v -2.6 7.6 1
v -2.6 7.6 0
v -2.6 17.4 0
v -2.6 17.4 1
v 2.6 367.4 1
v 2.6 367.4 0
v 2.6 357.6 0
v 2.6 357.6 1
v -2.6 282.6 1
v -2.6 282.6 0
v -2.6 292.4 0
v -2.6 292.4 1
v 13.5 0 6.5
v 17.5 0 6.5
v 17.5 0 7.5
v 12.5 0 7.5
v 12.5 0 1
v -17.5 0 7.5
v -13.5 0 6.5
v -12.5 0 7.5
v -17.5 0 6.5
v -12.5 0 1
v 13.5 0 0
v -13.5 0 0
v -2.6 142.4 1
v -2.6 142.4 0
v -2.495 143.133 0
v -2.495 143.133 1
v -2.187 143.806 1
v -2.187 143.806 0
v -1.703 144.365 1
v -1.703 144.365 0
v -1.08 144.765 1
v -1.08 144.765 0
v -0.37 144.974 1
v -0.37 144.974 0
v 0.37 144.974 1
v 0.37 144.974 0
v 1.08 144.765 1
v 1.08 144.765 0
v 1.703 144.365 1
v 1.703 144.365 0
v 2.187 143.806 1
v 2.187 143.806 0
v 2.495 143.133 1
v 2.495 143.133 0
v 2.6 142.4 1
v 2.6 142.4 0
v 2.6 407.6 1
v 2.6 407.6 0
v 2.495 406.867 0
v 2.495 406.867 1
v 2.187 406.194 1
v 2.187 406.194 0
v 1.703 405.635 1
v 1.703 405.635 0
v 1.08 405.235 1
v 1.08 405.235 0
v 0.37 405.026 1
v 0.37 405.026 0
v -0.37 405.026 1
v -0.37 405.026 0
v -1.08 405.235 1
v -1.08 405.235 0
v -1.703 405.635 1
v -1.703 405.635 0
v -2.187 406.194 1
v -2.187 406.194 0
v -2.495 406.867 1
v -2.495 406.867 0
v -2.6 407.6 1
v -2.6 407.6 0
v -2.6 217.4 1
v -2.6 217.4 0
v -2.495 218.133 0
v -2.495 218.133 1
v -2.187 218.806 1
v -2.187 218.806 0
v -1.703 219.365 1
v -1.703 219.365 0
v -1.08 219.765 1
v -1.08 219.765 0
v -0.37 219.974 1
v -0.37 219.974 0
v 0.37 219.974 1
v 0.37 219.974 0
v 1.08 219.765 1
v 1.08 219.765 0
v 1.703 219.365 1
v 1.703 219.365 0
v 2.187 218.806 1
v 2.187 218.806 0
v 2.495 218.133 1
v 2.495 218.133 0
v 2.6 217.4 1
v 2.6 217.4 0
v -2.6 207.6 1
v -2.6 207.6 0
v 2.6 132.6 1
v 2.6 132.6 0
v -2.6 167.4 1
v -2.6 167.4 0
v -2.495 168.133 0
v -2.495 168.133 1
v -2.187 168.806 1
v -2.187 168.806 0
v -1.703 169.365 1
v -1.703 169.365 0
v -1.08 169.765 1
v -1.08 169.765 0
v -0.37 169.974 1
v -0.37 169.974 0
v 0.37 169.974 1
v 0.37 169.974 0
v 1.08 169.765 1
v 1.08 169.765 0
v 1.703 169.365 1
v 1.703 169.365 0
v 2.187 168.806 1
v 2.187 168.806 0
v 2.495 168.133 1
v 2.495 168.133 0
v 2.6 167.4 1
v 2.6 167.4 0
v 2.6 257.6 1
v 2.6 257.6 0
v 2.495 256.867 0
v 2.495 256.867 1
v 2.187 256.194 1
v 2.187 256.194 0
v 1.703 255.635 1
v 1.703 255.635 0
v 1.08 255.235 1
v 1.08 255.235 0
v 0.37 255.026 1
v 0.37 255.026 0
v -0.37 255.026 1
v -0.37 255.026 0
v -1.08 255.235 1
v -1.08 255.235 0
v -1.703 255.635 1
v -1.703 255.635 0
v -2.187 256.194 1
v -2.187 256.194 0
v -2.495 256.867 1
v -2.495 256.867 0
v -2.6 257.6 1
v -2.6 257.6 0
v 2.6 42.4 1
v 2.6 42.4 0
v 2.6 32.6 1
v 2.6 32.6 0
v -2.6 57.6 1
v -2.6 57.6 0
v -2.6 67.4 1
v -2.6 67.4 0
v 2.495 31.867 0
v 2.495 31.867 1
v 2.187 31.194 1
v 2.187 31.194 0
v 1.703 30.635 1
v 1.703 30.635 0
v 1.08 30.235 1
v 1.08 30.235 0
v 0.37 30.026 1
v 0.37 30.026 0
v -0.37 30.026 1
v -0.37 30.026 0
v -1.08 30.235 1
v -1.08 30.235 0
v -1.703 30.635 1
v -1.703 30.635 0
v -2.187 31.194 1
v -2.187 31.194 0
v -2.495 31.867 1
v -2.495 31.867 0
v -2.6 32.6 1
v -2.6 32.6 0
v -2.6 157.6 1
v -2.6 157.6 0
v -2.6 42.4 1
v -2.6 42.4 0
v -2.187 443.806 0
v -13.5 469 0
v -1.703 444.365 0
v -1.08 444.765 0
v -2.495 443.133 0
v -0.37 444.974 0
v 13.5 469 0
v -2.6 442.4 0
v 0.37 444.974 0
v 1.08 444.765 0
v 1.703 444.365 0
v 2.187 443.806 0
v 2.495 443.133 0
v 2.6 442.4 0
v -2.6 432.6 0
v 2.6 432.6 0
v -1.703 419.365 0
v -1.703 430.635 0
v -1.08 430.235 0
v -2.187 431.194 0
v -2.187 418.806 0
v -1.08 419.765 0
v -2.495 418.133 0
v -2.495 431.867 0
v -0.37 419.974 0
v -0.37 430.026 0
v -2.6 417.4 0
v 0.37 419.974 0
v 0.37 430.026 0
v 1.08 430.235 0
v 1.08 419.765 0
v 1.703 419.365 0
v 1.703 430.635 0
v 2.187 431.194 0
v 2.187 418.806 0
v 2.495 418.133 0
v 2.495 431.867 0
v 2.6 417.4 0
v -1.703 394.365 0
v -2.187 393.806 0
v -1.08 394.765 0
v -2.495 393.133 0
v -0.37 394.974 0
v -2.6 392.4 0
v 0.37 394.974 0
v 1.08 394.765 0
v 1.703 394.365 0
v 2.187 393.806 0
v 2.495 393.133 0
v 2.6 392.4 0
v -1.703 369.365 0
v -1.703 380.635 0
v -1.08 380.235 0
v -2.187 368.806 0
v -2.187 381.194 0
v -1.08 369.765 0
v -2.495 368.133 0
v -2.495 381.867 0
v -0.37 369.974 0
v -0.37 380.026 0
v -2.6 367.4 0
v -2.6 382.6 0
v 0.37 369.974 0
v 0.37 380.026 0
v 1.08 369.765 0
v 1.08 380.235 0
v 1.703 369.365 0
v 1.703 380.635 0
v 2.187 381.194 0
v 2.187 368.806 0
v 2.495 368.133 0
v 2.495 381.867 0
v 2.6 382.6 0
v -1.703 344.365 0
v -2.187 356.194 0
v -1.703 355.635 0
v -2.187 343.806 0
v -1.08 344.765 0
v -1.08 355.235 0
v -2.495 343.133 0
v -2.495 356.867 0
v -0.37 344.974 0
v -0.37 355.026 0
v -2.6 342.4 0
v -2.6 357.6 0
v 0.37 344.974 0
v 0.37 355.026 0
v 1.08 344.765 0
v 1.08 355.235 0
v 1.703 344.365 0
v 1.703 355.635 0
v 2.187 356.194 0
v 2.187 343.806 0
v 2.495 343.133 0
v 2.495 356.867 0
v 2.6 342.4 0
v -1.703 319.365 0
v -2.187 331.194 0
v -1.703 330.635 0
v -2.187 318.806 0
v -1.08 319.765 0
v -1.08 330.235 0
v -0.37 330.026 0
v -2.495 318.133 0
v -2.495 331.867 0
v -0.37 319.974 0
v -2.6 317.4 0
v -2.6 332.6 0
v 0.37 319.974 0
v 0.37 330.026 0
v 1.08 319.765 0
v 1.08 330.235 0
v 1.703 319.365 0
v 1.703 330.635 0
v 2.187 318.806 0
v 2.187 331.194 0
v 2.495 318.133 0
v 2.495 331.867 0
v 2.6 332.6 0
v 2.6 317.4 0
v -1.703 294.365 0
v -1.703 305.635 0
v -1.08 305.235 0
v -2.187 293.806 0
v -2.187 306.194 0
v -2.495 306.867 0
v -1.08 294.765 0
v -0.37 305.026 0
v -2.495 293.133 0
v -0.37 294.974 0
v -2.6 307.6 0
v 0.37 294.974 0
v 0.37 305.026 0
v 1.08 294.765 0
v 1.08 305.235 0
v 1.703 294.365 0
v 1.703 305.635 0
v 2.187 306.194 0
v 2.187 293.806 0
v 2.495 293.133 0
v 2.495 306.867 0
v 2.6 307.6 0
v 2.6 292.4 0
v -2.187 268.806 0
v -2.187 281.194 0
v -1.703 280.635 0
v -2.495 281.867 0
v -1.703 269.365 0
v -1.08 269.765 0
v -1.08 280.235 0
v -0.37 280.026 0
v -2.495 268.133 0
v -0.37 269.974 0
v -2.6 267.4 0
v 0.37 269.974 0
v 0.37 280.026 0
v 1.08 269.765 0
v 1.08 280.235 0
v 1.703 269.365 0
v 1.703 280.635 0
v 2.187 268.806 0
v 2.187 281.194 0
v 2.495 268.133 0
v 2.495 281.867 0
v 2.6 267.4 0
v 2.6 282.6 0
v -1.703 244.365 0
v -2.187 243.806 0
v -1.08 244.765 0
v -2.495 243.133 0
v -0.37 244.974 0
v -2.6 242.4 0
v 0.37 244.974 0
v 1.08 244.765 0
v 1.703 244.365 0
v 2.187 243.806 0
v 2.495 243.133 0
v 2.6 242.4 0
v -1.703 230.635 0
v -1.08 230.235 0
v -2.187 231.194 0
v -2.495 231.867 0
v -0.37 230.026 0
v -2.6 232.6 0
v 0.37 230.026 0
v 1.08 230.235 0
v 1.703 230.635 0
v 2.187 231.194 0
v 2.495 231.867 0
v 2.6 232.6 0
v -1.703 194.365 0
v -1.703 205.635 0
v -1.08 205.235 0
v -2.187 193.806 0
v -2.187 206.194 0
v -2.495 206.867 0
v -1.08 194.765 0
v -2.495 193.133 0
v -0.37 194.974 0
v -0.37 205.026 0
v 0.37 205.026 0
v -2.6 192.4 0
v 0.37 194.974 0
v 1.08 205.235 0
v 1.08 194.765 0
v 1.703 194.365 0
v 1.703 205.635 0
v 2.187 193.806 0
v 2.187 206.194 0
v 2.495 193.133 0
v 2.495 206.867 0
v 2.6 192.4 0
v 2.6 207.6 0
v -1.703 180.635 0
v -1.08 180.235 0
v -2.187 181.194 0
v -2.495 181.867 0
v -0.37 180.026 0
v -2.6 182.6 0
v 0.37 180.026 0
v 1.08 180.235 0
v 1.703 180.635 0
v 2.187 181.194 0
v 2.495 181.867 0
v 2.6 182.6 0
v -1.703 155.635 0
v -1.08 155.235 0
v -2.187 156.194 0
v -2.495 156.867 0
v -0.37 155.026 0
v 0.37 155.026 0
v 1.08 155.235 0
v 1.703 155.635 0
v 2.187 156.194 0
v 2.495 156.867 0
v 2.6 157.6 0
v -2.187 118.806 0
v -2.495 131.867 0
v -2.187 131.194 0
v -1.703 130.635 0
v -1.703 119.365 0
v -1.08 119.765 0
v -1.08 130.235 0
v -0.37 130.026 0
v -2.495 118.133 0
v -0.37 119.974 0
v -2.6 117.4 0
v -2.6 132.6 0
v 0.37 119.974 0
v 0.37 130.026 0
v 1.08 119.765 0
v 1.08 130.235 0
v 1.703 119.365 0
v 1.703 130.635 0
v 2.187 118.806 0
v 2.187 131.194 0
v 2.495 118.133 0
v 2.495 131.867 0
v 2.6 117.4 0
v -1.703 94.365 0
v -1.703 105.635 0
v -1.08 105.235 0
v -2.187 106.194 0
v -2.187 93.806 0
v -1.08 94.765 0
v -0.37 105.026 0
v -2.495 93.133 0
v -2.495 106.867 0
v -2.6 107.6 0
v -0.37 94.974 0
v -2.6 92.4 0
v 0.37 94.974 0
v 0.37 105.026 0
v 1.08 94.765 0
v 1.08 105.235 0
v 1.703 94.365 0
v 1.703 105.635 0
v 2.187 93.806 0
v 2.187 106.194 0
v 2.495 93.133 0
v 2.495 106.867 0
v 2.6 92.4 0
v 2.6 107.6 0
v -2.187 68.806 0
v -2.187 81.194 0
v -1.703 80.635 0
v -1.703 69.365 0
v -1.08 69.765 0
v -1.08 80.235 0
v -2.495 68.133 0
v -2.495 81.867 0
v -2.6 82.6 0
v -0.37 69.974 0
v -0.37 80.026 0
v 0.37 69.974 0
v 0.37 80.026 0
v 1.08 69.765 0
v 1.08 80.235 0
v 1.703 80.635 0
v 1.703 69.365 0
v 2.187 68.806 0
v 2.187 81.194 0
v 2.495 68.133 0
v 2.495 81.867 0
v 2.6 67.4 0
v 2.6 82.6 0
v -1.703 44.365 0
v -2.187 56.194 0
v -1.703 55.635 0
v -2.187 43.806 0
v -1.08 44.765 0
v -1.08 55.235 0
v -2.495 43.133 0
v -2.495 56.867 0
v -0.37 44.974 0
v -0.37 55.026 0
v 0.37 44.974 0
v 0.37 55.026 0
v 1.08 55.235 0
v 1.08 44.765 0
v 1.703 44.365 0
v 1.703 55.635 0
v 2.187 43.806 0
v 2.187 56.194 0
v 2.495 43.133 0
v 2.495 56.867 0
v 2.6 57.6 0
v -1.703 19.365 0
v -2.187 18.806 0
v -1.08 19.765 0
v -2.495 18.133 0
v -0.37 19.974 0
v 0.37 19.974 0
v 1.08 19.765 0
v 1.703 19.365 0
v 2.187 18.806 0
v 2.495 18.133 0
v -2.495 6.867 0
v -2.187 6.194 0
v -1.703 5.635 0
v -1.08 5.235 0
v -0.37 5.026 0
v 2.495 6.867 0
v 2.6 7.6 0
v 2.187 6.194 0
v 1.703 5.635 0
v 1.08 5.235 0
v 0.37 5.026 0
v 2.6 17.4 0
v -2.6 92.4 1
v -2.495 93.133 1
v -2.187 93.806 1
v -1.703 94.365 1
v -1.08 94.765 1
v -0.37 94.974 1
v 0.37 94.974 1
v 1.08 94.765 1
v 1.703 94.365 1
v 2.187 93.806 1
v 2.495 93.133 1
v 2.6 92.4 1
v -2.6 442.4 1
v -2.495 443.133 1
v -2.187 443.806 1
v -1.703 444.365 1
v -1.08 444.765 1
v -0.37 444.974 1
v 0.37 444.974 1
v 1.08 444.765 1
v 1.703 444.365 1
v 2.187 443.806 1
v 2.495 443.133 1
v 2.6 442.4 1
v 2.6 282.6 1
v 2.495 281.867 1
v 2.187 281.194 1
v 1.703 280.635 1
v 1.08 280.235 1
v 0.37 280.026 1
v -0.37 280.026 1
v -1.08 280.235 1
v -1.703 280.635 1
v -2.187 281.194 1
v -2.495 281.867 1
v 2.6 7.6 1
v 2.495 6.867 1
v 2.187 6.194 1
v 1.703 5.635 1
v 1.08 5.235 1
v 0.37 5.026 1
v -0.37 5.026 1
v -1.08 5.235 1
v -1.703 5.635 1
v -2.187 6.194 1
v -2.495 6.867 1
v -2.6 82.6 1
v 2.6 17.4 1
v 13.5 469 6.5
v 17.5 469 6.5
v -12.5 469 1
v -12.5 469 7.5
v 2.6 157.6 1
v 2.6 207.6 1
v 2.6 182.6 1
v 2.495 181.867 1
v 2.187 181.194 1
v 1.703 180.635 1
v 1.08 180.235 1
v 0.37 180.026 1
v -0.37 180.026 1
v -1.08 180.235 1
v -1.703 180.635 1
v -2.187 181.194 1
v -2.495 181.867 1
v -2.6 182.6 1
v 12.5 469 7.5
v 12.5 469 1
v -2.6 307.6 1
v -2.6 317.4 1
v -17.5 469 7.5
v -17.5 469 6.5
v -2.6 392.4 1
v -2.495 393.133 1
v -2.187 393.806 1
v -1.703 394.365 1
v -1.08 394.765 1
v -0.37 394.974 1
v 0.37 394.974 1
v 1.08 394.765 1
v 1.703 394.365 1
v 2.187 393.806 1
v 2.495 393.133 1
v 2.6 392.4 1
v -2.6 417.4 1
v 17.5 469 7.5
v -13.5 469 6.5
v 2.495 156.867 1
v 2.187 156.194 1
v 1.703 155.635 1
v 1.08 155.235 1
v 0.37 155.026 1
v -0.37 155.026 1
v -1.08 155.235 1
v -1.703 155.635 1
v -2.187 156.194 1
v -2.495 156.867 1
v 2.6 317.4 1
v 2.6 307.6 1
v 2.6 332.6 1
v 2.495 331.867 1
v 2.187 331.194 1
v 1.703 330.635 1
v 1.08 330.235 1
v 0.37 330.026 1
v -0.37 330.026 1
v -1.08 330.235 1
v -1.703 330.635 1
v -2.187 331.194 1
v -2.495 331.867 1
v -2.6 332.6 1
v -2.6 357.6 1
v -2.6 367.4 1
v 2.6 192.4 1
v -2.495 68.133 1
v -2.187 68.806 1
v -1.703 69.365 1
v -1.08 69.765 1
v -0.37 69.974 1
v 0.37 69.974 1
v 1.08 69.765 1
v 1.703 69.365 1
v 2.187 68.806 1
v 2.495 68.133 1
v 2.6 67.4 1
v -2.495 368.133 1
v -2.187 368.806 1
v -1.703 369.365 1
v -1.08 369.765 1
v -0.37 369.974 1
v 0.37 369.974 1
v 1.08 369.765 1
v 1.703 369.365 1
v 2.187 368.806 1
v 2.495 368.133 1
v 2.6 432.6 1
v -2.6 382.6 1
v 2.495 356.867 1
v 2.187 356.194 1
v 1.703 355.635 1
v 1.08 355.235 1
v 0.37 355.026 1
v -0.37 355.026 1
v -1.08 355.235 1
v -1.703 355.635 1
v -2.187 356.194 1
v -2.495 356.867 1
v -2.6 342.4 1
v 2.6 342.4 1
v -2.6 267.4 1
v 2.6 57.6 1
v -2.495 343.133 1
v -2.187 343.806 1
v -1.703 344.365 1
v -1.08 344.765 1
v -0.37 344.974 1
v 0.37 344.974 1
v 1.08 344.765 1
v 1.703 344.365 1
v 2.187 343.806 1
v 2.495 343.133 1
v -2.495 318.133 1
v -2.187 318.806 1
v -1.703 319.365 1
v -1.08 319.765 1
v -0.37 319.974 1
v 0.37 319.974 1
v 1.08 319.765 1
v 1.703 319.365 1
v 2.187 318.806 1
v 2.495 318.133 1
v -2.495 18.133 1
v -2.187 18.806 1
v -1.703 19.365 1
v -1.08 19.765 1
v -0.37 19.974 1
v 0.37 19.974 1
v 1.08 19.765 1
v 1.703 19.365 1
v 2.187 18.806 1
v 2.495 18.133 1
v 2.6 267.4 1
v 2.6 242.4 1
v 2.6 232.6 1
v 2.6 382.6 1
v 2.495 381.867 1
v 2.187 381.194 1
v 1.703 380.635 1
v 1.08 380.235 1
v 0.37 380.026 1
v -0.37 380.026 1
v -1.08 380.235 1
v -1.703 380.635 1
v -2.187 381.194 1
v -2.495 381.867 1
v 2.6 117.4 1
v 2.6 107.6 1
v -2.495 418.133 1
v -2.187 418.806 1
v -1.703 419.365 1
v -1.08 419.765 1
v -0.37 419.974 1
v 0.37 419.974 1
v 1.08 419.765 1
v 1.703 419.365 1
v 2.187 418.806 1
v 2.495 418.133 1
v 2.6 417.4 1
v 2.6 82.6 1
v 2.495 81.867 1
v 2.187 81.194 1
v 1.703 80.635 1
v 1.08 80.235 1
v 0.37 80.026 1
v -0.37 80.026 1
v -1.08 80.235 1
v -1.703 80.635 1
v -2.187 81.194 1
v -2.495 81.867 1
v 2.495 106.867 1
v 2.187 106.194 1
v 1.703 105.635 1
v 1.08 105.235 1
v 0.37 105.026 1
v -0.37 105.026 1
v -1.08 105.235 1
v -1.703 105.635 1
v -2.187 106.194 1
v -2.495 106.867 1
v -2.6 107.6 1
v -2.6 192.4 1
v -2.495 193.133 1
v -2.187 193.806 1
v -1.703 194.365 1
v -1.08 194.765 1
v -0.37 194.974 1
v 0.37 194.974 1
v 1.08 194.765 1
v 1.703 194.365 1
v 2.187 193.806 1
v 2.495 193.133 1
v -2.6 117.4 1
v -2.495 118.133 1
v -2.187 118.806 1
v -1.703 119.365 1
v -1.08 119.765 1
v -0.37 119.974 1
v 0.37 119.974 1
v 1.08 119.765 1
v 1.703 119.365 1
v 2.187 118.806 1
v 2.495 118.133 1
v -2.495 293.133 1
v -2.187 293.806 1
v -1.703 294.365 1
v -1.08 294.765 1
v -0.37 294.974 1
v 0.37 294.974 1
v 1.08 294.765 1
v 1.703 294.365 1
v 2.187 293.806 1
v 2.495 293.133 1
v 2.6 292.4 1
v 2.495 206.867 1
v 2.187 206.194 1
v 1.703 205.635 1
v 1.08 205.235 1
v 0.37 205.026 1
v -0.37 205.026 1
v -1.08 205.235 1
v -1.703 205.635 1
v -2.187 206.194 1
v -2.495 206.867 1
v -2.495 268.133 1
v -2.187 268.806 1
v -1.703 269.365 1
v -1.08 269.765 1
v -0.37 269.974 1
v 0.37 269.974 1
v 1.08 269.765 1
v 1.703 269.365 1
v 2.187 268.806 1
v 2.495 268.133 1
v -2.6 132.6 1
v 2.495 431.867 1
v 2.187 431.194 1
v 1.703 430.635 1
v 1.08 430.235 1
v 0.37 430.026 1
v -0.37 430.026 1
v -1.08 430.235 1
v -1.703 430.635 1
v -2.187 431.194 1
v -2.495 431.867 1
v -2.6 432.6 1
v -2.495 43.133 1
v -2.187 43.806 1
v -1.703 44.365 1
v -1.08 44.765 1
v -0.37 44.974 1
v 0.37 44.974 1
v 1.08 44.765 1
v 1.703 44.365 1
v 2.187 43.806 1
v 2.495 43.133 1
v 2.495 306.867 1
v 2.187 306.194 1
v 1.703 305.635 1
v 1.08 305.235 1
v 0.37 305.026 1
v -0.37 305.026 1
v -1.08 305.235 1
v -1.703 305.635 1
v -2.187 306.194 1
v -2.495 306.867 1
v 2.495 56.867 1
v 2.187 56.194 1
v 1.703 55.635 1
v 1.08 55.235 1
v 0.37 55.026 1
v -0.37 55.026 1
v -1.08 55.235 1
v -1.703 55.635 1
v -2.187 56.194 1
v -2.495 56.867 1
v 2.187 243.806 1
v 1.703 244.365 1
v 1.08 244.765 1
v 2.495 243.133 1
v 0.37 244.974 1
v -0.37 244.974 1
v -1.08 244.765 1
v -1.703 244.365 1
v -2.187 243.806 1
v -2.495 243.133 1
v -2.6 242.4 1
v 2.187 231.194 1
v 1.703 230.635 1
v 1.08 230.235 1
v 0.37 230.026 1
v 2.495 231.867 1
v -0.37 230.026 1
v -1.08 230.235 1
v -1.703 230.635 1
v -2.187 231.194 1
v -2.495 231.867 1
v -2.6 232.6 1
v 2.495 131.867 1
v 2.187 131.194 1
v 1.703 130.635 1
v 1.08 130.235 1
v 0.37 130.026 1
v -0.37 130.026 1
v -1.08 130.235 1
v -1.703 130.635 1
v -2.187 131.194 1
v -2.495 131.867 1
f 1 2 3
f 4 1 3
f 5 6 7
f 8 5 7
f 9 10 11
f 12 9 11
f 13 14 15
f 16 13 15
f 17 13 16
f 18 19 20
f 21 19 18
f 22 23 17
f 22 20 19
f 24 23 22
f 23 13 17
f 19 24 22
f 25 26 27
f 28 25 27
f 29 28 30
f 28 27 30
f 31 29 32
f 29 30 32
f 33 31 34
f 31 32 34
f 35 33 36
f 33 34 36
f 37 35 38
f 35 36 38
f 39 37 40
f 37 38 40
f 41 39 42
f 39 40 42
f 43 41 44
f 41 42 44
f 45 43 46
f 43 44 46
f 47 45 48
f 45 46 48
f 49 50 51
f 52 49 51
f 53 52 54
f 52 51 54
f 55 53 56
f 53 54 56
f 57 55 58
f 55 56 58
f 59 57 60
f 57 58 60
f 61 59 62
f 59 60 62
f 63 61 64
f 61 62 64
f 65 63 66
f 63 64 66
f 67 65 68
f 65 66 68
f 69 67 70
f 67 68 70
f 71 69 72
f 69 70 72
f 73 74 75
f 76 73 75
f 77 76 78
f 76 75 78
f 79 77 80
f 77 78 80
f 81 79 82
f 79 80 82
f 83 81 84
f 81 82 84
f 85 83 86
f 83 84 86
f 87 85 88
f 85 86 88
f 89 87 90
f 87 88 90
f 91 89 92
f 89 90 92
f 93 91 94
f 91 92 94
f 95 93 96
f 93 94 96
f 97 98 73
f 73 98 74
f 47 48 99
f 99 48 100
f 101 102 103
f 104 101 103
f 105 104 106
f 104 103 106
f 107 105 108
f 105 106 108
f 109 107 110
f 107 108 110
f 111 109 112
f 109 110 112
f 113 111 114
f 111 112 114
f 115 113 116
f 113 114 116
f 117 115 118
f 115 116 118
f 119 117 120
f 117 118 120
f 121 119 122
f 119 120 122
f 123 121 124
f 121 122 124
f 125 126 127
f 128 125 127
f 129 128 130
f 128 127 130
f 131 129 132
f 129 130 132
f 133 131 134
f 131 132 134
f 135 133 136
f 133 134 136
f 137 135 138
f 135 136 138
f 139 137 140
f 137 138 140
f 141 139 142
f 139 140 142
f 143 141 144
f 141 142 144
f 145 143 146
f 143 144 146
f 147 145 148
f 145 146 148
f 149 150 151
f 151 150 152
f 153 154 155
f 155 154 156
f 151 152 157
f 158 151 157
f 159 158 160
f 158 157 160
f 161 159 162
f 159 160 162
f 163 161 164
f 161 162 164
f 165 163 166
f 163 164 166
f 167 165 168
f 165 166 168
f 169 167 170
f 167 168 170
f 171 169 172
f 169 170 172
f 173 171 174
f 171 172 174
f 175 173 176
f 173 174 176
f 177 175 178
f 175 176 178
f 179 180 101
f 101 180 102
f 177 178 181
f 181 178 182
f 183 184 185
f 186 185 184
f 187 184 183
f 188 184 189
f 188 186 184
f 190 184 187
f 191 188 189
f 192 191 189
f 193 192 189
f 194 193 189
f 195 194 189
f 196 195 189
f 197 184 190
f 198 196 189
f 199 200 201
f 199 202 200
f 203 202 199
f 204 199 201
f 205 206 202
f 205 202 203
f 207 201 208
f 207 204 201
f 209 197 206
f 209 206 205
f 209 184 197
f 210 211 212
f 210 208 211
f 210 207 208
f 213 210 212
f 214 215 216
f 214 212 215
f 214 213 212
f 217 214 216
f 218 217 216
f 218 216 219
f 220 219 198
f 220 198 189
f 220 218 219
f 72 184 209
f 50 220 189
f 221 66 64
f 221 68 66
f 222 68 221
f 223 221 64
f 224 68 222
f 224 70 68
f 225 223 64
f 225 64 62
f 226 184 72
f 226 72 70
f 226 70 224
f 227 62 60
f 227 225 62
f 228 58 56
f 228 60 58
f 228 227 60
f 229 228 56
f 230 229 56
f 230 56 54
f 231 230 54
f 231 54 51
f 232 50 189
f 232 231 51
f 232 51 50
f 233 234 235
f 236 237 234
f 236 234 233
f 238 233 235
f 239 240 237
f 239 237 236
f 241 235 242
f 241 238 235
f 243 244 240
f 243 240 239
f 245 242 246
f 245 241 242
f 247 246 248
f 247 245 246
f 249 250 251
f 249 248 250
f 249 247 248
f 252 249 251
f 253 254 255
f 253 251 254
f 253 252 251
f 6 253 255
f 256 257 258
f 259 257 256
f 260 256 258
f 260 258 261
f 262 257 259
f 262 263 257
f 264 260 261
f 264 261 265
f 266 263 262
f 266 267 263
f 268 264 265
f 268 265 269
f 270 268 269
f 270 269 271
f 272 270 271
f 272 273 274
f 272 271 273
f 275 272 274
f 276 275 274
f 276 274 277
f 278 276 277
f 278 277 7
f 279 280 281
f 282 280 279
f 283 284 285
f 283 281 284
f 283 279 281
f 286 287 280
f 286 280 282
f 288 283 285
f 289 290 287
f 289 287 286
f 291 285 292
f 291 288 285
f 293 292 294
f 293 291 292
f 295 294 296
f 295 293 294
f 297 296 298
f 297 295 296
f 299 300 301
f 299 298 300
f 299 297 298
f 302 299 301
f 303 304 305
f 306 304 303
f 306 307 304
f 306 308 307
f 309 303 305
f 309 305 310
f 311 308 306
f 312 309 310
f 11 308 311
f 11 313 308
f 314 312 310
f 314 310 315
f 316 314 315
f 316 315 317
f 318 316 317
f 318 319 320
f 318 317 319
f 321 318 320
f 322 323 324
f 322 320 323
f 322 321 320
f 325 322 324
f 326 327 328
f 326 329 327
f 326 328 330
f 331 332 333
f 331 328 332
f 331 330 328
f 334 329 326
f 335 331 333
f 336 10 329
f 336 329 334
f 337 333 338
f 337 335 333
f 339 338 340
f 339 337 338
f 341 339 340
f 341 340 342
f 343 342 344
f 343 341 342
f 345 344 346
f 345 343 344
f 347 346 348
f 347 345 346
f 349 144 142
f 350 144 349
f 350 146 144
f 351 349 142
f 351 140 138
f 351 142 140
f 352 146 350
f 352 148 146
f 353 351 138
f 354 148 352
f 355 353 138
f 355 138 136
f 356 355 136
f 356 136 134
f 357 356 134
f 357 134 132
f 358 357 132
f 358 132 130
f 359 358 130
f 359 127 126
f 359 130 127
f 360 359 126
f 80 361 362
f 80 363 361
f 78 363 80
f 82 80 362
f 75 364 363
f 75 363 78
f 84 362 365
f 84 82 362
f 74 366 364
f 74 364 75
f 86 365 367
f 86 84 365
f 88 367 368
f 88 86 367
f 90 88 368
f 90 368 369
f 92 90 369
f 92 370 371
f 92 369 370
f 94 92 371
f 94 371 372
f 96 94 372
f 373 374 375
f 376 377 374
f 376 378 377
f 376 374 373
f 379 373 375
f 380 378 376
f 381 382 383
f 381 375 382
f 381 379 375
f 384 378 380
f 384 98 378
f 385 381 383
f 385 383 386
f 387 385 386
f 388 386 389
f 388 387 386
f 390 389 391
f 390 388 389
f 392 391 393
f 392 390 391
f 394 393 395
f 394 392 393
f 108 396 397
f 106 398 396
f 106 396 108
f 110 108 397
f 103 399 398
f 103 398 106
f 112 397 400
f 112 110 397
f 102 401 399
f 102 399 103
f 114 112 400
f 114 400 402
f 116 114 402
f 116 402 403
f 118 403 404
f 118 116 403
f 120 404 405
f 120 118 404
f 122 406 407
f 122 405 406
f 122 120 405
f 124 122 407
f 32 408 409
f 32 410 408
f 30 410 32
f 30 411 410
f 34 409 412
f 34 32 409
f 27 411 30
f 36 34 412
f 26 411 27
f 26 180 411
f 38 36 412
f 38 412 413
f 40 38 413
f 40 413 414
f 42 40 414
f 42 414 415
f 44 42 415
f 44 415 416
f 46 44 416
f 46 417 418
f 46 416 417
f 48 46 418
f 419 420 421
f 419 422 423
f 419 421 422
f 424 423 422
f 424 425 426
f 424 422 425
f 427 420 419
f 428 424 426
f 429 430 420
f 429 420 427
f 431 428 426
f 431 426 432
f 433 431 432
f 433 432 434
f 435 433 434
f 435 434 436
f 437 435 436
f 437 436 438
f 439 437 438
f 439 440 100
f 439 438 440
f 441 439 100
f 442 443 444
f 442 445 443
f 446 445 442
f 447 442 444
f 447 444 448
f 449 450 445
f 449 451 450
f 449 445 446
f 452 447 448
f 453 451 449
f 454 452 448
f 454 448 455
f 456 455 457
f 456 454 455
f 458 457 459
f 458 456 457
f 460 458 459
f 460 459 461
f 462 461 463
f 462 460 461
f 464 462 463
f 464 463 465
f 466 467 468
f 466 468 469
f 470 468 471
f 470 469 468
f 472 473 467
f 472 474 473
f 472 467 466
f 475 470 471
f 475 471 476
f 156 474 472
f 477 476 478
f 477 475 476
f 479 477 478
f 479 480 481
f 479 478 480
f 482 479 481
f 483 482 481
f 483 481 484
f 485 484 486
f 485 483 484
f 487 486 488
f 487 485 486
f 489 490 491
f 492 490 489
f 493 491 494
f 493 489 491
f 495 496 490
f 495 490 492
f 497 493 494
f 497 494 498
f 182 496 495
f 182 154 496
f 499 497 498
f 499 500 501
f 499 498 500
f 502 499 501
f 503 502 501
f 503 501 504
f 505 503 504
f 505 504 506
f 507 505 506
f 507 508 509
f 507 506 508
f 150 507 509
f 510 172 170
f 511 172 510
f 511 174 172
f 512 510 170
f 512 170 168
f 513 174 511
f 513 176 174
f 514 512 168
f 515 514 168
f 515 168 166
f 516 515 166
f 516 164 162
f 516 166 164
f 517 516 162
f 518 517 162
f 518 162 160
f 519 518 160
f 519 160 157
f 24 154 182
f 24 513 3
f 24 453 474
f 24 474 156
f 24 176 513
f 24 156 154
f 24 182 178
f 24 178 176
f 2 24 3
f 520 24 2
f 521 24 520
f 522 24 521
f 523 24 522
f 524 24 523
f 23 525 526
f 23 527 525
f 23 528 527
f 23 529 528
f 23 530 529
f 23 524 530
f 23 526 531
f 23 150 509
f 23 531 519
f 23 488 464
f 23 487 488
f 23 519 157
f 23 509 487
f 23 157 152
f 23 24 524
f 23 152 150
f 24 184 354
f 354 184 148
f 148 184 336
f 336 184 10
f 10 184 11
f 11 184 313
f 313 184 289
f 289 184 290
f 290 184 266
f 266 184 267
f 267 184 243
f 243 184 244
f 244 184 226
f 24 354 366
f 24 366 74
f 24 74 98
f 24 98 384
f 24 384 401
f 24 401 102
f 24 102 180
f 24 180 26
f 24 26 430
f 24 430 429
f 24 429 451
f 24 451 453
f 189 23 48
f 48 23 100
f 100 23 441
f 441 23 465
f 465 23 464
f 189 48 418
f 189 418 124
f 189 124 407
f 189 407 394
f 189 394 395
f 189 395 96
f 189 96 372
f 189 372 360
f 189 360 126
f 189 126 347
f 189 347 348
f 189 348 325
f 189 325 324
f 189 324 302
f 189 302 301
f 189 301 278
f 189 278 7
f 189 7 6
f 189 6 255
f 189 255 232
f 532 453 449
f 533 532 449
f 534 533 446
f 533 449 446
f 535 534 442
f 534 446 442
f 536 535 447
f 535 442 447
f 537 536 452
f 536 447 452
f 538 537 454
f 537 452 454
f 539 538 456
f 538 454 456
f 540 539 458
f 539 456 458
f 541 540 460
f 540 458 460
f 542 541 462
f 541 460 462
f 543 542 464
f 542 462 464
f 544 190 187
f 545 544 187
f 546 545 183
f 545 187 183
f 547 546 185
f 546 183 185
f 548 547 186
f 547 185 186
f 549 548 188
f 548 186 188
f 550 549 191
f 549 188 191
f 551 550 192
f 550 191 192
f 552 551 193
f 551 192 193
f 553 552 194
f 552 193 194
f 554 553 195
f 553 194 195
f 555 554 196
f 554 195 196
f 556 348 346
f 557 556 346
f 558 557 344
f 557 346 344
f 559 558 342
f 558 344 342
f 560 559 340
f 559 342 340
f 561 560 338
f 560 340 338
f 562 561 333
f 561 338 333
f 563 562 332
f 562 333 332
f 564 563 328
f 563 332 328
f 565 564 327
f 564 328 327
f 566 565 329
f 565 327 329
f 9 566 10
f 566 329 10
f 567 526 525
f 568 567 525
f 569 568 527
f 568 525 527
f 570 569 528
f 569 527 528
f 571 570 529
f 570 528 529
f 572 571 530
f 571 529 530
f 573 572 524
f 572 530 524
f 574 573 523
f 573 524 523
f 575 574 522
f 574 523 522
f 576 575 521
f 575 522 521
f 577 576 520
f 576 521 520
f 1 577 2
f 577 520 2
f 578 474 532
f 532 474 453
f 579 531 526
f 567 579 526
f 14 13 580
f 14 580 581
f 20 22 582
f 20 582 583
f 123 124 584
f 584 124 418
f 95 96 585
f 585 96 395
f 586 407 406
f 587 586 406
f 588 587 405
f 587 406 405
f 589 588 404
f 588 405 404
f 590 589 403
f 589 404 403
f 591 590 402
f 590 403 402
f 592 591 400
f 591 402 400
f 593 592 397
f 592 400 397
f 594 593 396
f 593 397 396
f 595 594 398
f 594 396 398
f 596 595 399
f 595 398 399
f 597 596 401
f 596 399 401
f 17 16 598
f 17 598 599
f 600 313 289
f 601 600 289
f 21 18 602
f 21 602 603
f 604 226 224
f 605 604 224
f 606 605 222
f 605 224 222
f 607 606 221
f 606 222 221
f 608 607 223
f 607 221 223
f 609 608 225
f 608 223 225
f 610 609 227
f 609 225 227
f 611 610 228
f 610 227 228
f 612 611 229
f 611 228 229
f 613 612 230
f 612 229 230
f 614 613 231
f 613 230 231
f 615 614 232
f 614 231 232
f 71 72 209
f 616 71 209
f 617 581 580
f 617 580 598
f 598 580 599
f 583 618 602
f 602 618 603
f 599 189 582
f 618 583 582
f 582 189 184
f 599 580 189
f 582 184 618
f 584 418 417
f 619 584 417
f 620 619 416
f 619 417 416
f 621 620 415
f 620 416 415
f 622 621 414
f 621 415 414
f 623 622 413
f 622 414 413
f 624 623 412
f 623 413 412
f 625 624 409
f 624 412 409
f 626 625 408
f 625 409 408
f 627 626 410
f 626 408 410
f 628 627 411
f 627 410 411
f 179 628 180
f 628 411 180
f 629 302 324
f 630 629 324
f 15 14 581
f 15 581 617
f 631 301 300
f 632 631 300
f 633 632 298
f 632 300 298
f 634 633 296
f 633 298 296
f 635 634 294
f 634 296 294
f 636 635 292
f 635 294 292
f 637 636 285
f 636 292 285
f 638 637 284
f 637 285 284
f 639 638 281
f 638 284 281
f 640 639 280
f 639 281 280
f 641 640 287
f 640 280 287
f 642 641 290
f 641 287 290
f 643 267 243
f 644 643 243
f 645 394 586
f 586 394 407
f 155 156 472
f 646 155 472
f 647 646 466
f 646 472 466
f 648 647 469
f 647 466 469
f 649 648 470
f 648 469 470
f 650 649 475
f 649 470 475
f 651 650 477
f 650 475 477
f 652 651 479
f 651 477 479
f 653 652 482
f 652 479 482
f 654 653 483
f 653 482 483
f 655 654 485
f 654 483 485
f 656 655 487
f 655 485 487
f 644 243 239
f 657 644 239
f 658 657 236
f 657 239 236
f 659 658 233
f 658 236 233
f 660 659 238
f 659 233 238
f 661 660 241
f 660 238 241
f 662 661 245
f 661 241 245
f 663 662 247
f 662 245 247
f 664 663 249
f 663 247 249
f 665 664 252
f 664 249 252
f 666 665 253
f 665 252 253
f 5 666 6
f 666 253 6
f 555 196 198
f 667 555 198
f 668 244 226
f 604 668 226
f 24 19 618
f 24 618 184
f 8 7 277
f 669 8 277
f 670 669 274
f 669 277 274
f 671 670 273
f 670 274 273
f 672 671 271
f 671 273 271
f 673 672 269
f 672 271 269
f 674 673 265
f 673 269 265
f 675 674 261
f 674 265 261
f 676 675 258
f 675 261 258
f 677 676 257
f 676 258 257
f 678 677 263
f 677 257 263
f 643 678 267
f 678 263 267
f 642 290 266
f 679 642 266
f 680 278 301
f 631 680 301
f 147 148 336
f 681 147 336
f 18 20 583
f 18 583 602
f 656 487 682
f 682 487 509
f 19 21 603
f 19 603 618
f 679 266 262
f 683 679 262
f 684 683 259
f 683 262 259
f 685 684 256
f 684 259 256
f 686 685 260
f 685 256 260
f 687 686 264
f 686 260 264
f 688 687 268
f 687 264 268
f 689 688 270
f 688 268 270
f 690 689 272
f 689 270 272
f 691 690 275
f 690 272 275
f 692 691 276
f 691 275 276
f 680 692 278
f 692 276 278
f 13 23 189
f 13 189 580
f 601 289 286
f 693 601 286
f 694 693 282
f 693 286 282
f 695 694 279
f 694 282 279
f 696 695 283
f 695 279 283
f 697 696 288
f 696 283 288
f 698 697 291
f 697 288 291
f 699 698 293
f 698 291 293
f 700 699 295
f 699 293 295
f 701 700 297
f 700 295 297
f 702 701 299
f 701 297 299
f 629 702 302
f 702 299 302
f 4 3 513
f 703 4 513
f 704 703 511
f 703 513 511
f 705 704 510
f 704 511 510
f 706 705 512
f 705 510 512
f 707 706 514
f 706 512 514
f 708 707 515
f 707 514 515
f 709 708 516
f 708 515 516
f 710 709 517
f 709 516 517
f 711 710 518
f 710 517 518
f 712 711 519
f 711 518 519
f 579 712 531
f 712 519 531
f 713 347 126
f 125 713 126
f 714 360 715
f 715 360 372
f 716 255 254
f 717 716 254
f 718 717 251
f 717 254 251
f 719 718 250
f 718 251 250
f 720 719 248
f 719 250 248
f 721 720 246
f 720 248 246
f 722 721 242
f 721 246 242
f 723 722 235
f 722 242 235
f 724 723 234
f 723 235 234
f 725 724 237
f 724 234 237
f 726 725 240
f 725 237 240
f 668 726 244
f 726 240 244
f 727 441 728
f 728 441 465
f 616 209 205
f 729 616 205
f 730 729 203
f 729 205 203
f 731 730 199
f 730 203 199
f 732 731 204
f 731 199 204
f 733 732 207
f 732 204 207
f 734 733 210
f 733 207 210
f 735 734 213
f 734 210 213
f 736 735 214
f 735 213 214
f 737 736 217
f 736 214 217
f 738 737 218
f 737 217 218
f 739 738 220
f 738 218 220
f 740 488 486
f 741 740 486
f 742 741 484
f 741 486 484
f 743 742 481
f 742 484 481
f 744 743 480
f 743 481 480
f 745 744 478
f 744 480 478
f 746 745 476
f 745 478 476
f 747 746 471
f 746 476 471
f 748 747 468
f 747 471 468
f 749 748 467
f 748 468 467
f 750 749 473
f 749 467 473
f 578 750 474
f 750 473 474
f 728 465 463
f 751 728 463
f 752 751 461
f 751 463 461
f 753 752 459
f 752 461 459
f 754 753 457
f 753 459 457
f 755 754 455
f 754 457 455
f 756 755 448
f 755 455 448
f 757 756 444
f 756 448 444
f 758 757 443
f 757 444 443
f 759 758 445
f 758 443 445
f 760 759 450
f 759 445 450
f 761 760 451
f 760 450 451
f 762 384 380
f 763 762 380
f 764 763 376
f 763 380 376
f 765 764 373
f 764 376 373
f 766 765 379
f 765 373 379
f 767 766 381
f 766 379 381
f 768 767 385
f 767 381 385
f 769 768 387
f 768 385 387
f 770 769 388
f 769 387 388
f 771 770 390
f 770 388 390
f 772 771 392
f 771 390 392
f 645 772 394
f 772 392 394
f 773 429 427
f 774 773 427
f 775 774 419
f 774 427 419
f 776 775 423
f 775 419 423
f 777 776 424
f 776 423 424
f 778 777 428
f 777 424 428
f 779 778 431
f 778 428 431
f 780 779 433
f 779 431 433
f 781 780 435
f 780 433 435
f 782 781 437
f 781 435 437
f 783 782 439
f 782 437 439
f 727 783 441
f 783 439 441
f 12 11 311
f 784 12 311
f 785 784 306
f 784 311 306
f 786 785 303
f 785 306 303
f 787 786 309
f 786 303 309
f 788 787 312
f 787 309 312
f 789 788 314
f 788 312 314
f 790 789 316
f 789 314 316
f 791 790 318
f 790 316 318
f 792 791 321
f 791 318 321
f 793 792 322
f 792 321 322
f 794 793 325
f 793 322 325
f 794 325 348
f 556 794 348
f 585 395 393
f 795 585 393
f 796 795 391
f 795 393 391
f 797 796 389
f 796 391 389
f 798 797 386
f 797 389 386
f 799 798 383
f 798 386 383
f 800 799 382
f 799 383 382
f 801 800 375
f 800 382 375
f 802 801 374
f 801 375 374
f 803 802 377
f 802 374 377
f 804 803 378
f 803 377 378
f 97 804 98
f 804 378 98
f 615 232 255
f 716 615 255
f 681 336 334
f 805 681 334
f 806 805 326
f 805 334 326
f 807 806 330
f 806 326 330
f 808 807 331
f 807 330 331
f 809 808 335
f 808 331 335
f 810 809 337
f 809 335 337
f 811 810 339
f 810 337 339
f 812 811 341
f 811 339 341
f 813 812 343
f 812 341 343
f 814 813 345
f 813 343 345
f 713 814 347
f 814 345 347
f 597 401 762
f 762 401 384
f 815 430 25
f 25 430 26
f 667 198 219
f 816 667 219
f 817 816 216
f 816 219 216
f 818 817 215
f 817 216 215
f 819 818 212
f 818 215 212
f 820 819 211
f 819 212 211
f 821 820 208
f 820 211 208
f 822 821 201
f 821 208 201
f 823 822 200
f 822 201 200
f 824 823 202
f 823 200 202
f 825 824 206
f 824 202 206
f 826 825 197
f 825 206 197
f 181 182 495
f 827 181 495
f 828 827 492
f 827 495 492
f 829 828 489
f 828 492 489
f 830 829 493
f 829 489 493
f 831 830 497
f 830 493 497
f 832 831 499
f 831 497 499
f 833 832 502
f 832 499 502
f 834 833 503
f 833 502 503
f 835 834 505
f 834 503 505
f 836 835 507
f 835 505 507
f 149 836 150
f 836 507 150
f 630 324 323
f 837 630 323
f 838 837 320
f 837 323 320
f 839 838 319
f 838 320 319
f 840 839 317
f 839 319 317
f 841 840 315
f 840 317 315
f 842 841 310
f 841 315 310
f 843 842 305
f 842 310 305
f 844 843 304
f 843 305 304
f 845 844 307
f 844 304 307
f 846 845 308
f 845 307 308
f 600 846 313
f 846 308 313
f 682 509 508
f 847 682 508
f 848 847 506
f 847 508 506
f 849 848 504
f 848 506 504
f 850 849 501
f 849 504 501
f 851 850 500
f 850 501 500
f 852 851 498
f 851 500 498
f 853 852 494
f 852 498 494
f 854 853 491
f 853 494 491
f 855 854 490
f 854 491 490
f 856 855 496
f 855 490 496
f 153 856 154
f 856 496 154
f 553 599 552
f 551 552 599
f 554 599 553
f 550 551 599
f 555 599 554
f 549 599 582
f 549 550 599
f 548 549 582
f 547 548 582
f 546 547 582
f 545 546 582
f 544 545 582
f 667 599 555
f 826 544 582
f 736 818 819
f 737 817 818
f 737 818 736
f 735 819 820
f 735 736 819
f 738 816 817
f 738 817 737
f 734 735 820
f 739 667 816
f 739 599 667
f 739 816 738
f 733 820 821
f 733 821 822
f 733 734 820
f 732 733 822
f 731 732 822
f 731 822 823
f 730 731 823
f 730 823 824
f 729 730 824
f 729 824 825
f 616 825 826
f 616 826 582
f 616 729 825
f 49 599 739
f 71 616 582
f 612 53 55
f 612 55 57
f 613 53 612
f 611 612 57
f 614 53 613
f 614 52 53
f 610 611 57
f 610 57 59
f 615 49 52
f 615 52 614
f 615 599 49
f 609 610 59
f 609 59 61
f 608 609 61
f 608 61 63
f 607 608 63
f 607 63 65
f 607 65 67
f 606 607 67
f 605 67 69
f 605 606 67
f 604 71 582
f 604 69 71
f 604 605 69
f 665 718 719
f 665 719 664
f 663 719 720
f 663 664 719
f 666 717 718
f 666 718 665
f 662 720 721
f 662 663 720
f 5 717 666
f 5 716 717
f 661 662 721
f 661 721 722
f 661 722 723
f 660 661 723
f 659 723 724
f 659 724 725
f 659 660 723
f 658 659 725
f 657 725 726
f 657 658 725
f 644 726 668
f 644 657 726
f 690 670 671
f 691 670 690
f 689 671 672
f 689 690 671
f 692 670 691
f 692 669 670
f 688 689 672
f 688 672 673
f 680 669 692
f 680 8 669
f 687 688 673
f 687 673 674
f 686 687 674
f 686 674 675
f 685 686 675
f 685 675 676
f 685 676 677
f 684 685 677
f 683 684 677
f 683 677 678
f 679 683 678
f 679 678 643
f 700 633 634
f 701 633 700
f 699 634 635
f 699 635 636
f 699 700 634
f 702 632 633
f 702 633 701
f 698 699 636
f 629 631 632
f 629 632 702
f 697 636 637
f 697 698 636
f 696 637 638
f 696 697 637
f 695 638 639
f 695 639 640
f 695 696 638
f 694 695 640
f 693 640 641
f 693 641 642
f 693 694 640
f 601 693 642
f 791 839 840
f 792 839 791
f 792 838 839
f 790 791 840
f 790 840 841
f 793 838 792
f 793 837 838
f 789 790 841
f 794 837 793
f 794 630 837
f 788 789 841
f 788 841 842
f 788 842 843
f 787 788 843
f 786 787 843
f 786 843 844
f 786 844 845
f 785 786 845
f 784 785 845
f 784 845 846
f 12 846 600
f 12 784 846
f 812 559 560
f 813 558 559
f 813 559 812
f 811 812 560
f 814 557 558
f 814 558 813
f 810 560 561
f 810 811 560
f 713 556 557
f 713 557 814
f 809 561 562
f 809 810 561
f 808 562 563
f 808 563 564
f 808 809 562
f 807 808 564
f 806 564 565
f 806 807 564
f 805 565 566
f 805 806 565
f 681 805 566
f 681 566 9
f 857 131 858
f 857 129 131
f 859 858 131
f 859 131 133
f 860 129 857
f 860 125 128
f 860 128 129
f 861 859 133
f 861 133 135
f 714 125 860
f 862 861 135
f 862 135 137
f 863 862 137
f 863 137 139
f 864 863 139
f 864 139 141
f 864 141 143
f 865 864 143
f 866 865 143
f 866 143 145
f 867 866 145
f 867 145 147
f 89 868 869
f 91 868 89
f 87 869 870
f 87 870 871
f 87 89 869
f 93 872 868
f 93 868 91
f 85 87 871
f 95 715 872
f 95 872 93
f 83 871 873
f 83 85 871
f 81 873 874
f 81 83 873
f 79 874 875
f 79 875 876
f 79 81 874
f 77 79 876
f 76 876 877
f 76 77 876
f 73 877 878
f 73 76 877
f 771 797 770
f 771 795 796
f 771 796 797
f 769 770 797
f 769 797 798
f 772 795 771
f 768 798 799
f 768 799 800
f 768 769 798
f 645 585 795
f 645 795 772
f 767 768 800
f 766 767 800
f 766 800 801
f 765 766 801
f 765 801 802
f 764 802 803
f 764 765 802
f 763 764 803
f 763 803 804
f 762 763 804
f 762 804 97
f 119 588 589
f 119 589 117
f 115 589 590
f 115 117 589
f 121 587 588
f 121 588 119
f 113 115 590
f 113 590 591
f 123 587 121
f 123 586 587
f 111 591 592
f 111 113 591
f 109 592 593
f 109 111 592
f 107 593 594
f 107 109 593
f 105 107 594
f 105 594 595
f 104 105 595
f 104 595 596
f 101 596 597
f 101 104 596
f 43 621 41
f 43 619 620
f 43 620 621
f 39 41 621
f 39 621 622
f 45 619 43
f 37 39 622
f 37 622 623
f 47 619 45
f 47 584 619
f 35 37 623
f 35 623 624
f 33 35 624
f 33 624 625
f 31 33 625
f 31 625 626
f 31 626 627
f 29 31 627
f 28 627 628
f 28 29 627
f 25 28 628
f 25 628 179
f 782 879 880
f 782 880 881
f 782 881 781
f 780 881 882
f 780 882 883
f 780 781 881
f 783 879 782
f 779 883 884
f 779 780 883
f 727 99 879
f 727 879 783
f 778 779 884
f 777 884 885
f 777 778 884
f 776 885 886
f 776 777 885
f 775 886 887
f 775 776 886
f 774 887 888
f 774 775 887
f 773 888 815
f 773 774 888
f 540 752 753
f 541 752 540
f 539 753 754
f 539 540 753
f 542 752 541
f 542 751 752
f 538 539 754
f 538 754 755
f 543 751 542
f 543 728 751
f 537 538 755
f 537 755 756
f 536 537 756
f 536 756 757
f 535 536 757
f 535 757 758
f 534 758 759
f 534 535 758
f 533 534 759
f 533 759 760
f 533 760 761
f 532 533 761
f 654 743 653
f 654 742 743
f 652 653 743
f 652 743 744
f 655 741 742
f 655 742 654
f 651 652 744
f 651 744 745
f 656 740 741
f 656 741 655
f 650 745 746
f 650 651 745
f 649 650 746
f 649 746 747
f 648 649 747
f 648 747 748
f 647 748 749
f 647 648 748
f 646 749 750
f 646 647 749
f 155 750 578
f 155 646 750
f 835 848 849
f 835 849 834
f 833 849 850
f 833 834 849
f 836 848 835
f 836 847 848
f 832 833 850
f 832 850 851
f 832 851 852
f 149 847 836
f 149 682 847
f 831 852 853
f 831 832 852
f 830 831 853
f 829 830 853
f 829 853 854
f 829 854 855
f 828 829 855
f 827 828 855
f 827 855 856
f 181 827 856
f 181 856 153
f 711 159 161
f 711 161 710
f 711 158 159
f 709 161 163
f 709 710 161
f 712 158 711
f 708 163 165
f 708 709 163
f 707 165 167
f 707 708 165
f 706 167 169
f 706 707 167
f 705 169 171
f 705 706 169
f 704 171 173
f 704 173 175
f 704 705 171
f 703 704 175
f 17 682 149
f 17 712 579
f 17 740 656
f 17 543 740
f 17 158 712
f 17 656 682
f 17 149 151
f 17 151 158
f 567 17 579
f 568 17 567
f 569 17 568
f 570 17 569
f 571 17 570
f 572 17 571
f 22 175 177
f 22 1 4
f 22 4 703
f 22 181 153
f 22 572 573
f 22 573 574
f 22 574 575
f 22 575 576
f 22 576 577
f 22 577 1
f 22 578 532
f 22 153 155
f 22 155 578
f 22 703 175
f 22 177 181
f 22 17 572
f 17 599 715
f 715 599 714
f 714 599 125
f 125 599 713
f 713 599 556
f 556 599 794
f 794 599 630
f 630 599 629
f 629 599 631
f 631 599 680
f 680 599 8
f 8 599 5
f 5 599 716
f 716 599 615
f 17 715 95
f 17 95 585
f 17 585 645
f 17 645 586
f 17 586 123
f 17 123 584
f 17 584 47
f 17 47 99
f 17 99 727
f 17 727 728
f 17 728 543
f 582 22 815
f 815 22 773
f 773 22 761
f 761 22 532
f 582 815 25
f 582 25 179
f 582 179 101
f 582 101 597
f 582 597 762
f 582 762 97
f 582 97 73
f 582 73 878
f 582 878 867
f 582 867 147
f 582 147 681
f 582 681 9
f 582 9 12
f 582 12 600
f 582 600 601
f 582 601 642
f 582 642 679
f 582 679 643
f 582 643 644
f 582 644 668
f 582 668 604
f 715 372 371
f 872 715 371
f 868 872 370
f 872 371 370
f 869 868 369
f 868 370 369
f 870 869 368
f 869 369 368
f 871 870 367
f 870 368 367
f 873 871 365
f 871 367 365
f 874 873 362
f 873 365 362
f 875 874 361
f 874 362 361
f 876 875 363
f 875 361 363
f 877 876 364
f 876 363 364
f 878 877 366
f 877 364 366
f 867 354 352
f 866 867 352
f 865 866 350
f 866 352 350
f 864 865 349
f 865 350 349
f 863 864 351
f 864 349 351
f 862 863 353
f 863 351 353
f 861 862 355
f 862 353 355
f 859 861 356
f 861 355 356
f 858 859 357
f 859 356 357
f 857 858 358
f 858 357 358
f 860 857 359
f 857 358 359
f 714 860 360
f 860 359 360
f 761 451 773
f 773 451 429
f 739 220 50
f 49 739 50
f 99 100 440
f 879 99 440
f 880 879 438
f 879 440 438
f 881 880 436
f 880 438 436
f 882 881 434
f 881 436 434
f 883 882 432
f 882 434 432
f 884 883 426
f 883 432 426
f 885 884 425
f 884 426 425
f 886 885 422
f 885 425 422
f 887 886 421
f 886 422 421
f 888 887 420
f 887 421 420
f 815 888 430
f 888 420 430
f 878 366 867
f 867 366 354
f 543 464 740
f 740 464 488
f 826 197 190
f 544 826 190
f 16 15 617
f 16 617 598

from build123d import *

# Parameters (mm, degrees)
RAIL_DEPTH       = 469
SLOTS_DEPTH      = 470.386301462
SLOTS_DEPTH_BACK = 470.386301462


with BuildPart() as part:
    # Sketch1 → Rail (new body)
    with BuildSketch(Plane(origin=(0, 0, 0), x_dir=(1, 0, 0), z_dir=(0, 1, 0))):
        Polygon((-13.5, 0), (13.5, 0), (13.5, -6.5), (17.5, -6.5), (17.5, -7.5), (12.5, -7.5), (12.5, -1), (-12.5, -1), (-12.5, -7.5), (-17.5, -7.5), (-17.5, -6.5), (-13.5, -6.5), align=None)
    extrude(amount=RAIL_DEPTH)

    # Sketch2 → Slots (cut, two sides: drawn at the far end of the back side and taken through both)
    with BuildSketch(Plane.XY.offset(-SLOTS_DEPTH_BACK)):
        with BuildLine():
            Line((-2.6, 7.6), (-2.6, 17.4))
            ThreePointArc((-2.6, 17.4), (0, 20), (2.6, 17.4))
            Line((2.6, 17.4), (2.6, 7.6))
            ThreePointArc((2.6, 7.6), (0, 5), (-2.6, 7.6))
        make_face()
        with BuildLine():
            Line((-2.6, 32.6), (-2.6, 42.4))
            ThreePointArc((-2.6, 42.4), (0, 45), (2.6, 42.4))
            Line((2.6, 42.4), (2.6, 32.6))
            ThreePointArc((2.6, 32.6), (0, 30), (-2.6, 32.6))
        make_face()
        with BuildLine():
            Line((-2.6, 57.6), (-2.6, 67.4))
            ThreePointArc((-2.6, 67.4), (0, 70), (2.6, 67.4))
            Line((2.6, 67.4), (2.6, 57.6))
            ThreePointArc((2.6, 57.6), (0, 55), (-2.6, 57.6))
        make_face()
        with BuildLine():
            Line((-2.6, 82.6), (-2.6, 92.4))
            ThreePointArc((-2.6, 92.4), (0, 95), (2.6, 92.4))
            Line((2.6, 92.4), (2.6, 82.6))
            ThreePointArc((2.6, 82.6), (0, 80), (-2.6, 82.6))
        make_face()
        with BuildLine():
            Line((-2.6, 107.6), (-2.6, 117.4))
            ThreePointArc((-2.6, 117.4), (0, 120), (2.6, 117.4))
            Line((2.6, 117.4), (2.6, 107.6))
            ThreePointArc((2.6, 107.6), (0, 105), (-2.6, 107.6))
        make_face()
        with BuildLine():
            Line((-2.6, 132.6), (-2.6, 142.4))
            ThreePointArc((-2.6, 142.4), (0, 145), (2.6, 142.4))
            Line((2.6, 142.4), (2.6, 132.6))
            ThreePointArc((2.6, 132.6), (0, 130), (-2.6, 132.6))
        make_face()
        with BuildLine():
            Line((-2.6, 157.6), (-2.6, 167.4))
            ThreePointArc((-2.6, 167.4), (0, 170), (2.6, 167.4))
            Line((2.6, 167.4), (2.6, 157.6))
            ThreePointArc((2.6, 157.6), (0, 155), (-2.6, 157.6))
        make_face()
        with BuildLine():
            Line((-2.6, 182.6), (-2.6, 192.4))
            ThreePointArc((-2.6, 192.4), (0, 195), (2.6, 192.4))
            Line((2.6, 192.4), (2.6, 182.6))
            ThreePointArc((2.6, 182.6), (0, 180), (-2.6, 182.6))
        make_face()
        with BuildLine():
            Line((-2.6, 207.6), (-2.6, 217.4))
            ThreePointArc((-2.6, 217.4), (0, 220), (2.6, 217.4))
            Line((2.6, 217.4), (2.6, 207.6))
            ThreePointArc((2.6, 207.6), (0, 205), (-2.6, 207.6))
        make_face()
        with BuildLine():
            Line((-2.6, 232.6), (-2.6, 242.4))
            ThreePointArc((-2.6, 242.4), (0, 245), (2.6, 242.4))
            Line((2.6, 242.4), (2.6, 232.6))
            ThreePointArc((2.6, 232.6), (0, 230), (-2.6, 232.6))
        make_face()
        with BuildLine():
            Line((-2.6, 257.6), (-2.6, 267.4))
            ThreePointArc((-2.6, 267.4), (0, 270), (2.6, 267.4))
            Line((2.6, 267.4), (2.6, 257.6))
            ThreePointArc((2.6, 257.6), (0, 255), (-2.6, 257.6))
        make_face()
        with BuildLine():
            Line((-2.6, 282.6), (-2.6, 292.4))
            ThreePointArc((-2.6, 292.4), (0, 295), (2.6, 292.4))
            Line((2.6, 292.4), (2.6, 282.6))
            ThreePointArc((2.6, 282.6), (0, 280), (-2.6, 282.6))
        make_face()
        with BuildLine():
            Line((-2.6, 307.6), (-2.6, 317.4))
            ThreePointArc((-2.6, 317.4), (0, 320), (2.6, 317.4))
            Line((2.6, 317.4), (2.6, 307.6))
            ThreePointArc((2.6, 307.6), (0, 305), (-2.6, 307.6))
        make_face()
        with BuildLine():
            Line((-2.6, 332.6), (-2.6, 342.4))
            ThreePointArc((-2.6, 342.4), (0, 345), (2.6, 342.4))
            Line((2.6, 342.4), (2.6, 332.6))
            ThreePointArc((2.6, 332.6), (0, 330), (-2.6, 332.6))
        make_face()
        with BuildLine():
            Line((-2.6, 357.6), (-2.6, 367.4))
            ThreePointArc((-2.6, 367.4), (0, 370), (2.6, 367.4))
            Line((2.6, 367.4), (2.6, 357.6))
            ThreePointArc((2.6, 357.6), (0, 355), (-2.6, 357.6))
        make_face()
        with BuildLine():
            Line((-2.6, 382.6), (-2.6, 392.4))
            ThreePointArc((-2.6, 392.4), (0, 395), (2.6, 392.4))
            Line((2.6, 392.4), (2.6, 382.6))
            ThreePointArc((2.6, 382.6), (0, 380), (-2.6, 382.6))
        make_face()
        with BuildLine():
            Line((-2.6, 407.6), (-2.6, 417.4))
            ThreePointArc((-2.6, 417.4), (0, 420), (2.6, 417.4))
            Line((2.6, 417.4), (2.6, 407.6))
            ThreePointArc((2.6, 407.6), (0, 405), (-2.6, 407.6))
        make_face()
        with BuildLine():
            Line((-2.6, 432.6), (-2.6, 442.4))
            ThreePointArc((-2.6, 442.4), (0, 445), (2.6, 442.4))
            Line((2.6, 442.4), (2.6, 432.6))
            ThreePointArc((2.6, 432.6), (0, 430), (-2.6, 432.6))
        make_face()
    extrude(amount=SLOTS_DEPTH + SLOTS_DEPTH_BACK, mode=Mode.SUBTRACT)


solid = part.part
